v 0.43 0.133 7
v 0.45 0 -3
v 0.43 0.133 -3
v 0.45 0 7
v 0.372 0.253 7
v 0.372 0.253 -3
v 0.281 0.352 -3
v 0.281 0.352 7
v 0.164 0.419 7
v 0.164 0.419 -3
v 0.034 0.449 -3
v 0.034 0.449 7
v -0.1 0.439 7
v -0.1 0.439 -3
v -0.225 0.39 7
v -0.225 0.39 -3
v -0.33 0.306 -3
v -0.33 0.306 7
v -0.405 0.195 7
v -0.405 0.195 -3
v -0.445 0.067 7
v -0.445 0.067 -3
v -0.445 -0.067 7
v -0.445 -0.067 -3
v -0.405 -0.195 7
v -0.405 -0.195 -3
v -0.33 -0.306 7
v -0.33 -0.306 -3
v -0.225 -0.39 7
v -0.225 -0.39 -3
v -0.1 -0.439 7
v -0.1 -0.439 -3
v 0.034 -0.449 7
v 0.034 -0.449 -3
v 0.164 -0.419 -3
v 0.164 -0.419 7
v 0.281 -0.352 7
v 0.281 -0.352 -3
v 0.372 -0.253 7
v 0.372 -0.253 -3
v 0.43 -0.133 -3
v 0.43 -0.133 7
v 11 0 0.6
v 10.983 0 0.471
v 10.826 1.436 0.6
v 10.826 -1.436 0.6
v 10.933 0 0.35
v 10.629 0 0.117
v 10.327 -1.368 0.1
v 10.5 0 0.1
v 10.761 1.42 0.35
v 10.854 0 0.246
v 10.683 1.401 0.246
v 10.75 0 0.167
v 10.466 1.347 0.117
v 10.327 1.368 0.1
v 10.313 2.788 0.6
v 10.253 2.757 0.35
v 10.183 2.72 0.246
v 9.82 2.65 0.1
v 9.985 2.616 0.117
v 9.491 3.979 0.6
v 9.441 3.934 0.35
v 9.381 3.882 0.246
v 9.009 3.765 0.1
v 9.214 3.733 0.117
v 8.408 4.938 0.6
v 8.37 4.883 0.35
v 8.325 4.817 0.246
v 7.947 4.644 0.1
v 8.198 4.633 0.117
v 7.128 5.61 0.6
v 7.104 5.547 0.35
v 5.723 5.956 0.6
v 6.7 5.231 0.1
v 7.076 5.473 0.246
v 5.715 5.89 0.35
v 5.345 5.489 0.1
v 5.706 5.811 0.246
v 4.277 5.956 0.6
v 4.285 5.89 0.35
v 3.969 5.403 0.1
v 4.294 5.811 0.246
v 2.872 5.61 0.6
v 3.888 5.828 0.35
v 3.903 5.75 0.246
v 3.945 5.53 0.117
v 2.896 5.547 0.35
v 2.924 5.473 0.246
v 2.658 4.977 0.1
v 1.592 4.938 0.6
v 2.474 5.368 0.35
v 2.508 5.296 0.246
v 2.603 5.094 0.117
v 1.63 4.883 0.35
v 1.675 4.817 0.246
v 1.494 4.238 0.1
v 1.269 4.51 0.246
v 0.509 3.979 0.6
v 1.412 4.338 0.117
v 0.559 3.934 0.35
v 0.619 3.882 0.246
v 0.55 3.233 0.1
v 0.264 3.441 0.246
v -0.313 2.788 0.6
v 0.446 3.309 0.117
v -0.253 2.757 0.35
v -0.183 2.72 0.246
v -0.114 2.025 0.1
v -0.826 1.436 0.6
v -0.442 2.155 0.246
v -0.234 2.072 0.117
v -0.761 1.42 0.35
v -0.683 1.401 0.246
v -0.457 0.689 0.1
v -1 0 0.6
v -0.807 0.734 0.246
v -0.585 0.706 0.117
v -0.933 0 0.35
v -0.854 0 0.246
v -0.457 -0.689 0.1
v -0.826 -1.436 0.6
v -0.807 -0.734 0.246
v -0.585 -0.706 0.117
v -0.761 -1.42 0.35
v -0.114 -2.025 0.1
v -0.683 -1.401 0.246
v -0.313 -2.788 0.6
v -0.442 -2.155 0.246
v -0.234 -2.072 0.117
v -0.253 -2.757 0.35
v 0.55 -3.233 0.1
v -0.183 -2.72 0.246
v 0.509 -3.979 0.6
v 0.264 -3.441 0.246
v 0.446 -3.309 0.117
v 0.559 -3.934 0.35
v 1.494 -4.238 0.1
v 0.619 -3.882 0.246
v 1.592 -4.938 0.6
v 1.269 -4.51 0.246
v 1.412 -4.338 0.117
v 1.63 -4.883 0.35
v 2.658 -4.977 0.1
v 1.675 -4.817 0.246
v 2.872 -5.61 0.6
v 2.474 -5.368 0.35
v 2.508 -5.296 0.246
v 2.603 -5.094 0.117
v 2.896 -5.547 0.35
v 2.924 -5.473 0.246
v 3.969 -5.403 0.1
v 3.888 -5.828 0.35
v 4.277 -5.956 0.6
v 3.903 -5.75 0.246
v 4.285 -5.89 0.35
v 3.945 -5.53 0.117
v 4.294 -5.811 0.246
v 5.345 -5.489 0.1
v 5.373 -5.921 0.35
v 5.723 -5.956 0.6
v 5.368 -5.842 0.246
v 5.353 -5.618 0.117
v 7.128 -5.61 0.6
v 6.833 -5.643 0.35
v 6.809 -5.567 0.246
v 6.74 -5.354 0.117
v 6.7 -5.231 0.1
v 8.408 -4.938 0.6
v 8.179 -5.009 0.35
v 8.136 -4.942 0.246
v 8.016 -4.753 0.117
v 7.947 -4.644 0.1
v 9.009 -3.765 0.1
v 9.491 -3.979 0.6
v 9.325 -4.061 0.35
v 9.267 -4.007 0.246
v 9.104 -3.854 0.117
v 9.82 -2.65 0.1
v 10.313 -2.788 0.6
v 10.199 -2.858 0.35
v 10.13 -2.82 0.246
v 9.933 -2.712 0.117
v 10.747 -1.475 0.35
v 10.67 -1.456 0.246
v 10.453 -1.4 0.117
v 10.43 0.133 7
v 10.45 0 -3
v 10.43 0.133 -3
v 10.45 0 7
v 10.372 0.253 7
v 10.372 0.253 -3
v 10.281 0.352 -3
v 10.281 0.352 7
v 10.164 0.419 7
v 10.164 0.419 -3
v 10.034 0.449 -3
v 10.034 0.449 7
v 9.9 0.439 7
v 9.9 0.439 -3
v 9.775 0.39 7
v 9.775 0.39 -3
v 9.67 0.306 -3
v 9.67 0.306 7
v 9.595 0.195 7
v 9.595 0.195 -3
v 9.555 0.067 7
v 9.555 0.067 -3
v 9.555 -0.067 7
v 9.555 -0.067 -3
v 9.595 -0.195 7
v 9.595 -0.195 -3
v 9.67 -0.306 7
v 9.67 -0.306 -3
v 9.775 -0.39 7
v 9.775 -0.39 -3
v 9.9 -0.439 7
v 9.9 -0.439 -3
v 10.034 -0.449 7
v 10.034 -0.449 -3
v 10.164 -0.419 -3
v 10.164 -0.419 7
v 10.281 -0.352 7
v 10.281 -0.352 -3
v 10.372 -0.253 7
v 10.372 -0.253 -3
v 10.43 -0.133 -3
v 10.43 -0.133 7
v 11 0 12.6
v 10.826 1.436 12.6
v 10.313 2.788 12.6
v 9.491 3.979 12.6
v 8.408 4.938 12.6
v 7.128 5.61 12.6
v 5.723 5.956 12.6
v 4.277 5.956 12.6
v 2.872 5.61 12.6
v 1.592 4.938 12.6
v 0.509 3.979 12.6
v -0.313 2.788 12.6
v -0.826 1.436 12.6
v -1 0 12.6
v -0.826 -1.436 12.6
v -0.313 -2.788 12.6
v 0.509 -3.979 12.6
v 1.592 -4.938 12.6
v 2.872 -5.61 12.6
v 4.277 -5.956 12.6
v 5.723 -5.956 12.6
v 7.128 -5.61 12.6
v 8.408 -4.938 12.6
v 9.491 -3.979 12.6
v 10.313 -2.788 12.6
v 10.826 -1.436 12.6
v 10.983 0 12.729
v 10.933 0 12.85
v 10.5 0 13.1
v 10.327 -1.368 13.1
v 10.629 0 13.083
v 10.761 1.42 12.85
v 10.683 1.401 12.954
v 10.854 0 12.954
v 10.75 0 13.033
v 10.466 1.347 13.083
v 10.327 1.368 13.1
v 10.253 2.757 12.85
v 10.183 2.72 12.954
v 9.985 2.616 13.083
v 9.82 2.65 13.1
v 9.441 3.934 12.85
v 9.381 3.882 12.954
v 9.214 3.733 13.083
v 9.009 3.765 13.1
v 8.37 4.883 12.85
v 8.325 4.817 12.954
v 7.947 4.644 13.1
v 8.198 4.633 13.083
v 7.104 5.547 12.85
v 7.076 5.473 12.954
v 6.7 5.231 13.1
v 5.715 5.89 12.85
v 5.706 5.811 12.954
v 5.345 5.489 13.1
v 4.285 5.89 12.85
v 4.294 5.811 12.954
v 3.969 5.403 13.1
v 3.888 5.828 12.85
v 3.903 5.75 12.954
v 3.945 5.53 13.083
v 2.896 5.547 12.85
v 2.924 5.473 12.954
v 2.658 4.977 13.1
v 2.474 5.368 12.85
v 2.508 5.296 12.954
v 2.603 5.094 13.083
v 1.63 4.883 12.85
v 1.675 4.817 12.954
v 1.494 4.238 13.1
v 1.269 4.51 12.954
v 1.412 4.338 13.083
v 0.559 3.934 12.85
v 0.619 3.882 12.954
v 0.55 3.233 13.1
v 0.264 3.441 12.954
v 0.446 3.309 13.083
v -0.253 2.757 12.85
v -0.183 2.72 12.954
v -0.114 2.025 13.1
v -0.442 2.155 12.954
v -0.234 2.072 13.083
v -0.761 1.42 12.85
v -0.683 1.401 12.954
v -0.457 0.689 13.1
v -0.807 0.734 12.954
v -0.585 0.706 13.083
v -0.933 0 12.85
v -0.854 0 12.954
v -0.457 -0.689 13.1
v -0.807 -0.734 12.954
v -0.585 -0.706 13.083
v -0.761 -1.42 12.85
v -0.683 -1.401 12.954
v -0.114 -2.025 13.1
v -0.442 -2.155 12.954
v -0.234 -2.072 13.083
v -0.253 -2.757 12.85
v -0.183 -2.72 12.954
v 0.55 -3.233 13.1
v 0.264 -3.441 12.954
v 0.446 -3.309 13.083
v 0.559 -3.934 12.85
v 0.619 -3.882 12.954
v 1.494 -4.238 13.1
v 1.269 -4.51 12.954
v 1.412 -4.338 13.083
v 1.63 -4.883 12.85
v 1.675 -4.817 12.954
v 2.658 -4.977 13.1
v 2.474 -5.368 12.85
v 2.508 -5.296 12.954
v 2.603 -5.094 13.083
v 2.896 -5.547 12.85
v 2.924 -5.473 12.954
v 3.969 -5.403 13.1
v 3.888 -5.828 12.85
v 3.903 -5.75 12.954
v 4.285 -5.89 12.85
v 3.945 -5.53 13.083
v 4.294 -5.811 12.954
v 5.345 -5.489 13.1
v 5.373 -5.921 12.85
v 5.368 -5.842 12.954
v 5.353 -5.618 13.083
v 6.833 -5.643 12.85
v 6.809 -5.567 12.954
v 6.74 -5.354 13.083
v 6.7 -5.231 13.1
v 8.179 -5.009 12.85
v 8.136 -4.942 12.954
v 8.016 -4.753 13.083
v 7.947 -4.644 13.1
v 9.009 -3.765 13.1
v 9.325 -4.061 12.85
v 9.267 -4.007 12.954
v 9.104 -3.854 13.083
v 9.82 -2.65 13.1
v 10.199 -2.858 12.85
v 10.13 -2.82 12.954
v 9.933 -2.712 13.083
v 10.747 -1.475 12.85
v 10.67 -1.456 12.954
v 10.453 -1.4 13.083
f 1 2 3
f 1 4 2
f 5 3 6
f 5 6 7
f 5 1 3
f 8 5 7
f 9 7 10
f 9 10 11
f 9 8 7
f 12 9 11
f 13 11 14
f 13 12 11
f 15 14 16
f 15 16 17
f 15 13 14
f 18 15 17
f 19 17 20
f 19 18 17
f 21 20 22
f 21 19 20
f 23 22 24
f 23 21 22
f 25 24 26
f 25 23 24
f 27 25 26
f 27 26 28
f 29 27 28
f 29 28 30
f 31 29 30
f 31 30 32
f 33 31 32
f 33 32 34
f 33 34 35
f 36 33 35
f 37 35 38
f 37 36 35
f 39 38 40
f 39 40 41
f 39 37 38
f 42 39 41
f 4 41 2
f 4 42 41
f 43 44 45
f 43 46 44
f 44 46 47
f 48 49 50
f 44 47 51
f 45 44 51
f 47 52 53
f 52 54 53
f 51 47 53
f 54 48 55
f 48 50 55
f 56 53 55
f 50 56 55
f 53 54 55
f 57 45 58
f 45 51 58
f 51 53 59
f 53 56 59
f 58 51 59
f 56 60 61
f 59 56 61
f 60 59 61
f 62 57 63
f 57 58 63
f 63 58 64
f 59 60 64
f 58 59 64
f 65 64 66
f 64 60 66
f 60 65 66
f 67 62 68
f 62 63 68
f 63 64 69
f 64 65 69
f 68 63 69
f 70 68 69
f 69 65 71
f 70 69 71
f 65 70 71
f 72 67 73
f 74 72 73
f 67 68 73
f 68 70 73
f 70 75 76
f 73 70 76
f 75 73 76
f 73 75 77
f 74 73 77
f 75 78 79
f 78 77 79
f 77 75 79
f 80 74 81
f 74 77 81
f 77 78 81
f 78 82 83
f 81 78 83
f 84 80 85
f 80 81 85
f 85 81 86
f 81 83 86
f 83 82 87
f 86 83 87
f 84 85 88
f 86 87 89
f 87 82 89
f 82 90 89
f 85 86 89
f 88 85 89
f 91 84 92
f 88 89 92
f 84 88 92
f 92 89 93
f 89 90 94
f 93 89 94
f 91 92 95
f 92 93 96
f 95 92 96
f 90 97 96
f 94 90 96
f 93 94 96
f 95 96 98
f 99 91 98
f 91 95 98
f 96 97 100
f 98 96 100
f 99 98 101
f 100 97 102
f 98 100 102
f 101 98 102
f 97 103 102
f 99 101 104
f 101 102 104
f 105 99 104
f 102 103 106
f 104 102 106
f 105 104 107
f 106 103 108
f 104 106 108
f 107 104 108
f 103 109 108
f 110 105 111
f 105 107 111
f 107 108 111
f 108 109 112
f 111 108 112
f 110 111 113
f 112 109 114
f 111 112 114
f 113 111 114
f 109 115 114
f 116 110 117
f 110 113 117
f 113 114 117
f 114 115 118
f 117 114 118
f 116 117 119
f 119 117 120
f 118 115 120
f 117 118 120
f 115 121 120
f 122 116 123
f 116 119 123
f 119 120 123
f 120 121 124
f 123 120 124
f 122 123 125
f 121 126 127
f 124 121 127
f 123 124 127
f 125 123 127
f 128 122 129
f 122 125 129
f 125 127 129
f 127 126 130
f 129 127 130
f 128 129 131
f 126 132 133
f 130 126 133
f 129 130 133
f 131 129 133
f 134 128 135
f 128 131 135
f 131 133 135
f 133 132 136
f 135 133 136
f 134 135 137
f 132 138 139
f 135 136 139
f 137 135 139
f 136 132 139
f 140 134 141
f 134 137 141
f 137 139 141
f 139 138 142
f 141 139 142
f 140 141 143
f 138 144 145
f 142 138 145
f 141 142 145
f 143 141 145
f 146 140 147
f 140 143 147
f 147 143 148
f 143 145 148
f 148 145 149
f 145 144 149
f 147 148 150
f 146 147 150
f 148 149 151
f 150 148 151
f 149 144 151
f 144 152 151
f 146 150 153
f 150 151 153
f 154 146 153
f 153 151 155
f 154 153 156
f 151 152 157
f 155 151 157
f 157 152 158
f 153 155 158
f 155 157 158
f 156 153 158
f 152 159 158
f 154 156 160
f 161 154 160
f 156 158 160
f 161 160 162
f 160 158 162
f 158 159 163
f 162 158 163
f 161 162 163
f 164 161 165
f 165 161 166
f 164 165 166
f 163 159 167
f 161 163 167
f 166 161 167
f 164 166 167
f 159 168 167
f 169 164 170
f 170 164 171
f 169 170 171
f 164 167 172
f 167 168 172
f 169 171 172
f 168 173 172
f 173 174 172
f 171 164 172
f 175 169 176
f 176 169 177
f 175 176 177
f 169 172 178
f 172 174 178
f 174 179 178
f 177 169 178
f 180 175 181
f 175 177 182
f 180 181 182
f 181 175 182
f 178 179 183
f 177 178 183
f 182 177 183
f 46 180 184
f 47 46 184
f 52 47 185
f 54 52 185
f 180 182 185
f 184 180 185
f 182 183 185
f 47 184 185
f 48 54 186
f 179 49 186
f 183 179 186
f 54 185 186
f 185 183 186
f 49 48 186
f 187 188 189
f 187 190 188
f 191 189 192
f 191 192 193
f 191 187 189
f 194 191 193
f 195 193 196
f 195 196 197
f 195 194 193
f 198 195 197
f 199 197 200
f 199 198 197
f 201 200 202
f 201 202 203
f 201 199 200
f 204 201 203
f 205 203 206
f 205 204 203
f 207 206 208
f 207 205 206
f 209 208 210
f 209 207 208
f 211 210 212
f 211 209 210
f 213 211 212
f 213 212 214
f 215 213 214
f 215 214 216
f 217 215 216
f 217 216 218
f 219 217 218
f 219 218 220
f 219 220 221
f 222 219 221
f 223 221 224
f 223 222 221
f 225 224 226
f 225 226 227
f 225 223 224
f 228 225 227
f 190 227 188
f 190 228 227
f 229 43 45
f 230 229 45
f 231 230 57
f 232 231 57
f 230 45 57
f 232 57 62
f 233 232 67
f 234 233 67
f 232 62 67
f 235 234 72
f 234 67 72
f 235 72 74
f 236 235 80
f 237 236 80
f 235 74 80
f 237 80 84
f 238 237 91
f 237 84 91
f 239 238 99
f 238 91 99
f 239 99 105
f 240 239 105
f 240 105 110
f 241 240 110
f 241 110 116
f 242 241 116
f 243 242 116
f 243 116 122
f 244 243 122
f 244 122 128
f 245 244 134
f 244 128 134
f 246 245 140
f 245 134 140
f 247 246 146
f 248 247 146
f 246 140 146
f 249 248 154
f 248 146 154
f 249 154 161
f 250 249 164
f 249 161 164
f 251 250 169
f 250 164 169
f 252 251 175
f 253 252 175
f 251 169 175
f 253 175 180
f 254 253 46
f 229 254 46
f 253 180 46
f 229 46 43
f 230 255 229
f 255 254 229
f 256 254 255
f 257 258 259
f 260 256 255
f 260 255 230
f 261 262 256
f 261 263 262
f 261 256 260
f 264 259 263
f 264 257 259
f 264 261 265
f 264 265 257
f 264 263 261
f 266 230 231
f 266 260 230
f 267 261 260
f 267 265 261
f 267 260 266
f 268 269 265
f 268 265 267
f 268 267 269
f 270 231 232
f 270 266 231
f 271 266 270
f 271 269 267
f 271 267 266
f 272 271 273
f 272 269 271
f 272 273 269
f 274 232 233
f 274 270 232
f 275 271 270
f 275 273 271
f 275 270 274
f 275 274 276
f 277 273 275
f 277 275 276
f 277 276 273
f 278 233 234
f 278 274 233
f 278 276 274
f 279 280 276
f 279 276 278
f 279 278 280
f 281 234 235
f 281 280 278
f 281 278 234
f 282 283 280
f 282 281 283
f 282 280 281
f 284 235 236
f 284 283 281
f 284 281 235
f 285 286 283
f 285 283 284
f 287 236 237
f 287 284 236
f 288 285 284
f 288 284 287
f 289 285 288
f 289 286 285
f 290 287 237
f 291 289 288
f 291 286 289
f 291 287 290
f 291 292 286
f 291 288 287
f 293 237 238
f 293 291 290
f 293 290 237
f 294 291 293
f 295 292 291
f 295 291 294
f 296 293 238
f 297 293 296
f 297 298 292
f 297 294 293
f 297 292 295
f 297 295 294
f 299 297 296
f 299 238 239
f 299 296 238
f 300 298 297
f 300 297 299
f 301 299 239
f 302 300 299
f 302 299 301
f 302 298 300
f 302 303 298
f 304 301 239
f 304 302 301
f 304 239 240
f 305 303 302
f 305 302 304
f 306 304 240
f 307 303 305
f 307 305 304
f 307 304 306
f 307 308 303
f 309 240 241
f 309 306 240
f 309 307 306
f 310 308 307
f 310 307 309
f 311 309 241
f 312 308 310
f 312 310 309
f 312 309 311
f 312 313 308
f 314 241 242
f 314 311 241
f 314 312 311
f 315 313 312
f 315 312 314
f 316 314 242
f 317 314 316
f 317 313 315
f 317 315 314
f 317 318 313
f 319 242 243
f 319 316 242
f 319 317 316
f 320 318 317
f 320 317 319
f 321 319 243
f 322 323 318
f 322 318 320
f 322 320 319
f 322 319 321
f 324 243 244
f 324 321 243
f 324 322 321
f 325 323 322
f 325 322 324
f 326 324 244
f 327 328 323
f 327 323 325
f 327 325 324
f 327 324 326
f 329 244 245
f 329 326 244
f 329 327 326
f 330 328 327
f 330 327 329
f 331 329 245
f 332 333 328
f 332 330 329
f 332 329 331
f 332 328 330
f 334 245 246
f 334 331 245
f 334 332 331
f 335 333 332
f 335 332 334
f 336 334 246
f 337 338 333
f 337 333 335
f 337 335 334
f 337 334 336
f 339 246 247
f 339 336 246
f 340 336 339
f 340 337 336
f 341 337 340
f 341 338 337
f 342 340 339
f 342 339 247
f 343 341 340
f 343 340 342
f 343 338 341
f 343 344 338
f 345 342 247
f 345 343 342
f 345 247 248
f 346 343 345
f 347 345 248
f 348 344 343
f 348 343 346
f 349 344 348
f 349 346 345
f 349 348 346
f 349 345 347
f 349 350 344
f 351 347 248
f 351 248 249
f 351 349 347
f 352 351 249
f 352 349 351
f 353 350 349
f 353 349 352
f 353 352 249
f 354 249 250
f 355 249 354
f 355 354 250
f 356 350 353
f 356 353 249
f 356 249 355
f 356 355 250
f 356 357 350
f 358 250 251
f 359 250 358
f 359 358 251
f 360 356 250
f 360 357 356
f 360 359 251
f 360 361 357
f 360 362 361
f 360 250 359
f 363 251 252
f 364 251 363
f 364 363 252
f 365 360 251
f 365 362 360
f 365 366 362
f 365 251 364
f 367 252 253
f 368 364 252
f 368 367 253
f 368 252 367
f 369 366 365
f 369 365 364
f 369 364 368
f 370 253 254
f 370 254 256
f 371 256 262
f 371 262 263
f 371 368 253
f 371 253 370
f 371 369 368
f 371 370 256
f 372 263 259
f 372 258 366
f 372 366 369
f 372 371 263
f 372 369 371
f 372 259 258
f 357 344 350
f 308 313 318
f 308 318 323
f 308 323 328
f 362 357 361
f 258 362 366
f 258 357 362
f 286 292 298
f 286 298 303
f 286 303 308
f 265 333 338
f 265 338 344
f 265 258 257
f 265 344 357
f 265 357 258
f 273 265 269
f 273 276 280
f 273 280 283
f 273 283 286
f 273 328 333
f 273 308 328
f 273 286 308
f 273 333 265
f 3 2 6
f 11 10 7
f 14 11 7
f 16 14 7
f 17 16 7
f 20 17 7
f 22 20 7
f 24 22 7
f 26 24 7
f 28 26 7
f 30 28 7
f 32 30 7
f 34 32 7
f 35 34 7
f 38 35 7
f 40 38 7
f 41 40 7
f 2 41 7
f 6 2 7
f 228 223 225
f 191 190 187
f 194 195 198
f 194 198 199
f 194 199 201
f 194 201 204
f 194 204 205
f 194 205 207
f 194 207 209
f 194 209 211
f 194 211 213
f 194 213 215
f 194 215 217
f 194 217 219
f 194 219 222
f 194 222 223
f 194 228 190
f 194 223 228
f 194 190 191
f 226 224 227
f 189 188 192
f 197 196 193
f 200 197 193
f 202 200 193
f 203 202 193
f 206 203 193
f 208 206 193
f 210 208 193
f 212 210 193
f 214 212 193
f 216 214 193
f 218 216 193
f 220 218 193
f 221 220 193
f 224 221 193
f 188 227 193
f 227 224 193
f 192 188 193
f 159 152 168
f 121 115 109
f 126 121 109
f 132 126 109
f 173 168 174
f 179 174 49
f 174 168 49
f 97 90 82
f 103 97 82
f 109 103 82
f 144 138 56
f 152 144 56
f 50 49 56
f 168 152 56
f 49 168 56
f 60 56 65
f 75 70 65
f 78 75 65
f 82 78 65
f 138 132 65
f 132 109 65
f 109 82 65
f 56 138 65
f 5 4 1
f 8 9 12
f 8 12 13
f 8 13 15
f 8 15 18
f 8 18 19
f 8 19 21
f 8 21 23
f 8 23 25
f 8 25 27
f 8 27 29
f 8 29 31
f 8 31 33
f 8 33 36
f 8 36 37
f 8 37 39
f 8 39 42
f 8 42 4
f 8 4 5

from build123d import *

# Parameters (mm, degrees)
SKETCH001_R       = 0.45
PAD001_DEPTH      = 6.5
PAD001_DEPTH_BACK = 3.5
SKETCH_R          = 6
PAD_DEPTH         = 13
FILLET_R          = 0.5


with BuildPart() as pad001:
    # Sketch001 → Pad001 (new body, two sides)
    with BuildSketch(Plane.XY.offset(0.5)) as pad001_sk:
        Circle(SKETCH001_R)
        with Locations((10, 0)):
            Circle(SKETCH001_R)
    extrude(amount=PAD001_DEPTH)
    extrude(pad001_sk.sketch, amount=-PAD001_DEPTH_BACK)


with BuildPart() as fillet_body:
    # Sketch → Pad (new body)
    with BuildSketch(Plane.XY.offset(0.1)):
        with Locations((5, 0)):
            Circle(SKETCH_R)
    extrude(amount=PAD_DEPTH)

    # Fillet
    fillet_edges = [fillet_body.edges().sort_by_distance(p)[0] for p in [
        (-1, 0, 0.1),
        (-1, 0, 13.1),
    ]]
    fillet(fillet_edges, radius=FILLET_R)


solid = Compound([pad001.part, fillet_body.part])
